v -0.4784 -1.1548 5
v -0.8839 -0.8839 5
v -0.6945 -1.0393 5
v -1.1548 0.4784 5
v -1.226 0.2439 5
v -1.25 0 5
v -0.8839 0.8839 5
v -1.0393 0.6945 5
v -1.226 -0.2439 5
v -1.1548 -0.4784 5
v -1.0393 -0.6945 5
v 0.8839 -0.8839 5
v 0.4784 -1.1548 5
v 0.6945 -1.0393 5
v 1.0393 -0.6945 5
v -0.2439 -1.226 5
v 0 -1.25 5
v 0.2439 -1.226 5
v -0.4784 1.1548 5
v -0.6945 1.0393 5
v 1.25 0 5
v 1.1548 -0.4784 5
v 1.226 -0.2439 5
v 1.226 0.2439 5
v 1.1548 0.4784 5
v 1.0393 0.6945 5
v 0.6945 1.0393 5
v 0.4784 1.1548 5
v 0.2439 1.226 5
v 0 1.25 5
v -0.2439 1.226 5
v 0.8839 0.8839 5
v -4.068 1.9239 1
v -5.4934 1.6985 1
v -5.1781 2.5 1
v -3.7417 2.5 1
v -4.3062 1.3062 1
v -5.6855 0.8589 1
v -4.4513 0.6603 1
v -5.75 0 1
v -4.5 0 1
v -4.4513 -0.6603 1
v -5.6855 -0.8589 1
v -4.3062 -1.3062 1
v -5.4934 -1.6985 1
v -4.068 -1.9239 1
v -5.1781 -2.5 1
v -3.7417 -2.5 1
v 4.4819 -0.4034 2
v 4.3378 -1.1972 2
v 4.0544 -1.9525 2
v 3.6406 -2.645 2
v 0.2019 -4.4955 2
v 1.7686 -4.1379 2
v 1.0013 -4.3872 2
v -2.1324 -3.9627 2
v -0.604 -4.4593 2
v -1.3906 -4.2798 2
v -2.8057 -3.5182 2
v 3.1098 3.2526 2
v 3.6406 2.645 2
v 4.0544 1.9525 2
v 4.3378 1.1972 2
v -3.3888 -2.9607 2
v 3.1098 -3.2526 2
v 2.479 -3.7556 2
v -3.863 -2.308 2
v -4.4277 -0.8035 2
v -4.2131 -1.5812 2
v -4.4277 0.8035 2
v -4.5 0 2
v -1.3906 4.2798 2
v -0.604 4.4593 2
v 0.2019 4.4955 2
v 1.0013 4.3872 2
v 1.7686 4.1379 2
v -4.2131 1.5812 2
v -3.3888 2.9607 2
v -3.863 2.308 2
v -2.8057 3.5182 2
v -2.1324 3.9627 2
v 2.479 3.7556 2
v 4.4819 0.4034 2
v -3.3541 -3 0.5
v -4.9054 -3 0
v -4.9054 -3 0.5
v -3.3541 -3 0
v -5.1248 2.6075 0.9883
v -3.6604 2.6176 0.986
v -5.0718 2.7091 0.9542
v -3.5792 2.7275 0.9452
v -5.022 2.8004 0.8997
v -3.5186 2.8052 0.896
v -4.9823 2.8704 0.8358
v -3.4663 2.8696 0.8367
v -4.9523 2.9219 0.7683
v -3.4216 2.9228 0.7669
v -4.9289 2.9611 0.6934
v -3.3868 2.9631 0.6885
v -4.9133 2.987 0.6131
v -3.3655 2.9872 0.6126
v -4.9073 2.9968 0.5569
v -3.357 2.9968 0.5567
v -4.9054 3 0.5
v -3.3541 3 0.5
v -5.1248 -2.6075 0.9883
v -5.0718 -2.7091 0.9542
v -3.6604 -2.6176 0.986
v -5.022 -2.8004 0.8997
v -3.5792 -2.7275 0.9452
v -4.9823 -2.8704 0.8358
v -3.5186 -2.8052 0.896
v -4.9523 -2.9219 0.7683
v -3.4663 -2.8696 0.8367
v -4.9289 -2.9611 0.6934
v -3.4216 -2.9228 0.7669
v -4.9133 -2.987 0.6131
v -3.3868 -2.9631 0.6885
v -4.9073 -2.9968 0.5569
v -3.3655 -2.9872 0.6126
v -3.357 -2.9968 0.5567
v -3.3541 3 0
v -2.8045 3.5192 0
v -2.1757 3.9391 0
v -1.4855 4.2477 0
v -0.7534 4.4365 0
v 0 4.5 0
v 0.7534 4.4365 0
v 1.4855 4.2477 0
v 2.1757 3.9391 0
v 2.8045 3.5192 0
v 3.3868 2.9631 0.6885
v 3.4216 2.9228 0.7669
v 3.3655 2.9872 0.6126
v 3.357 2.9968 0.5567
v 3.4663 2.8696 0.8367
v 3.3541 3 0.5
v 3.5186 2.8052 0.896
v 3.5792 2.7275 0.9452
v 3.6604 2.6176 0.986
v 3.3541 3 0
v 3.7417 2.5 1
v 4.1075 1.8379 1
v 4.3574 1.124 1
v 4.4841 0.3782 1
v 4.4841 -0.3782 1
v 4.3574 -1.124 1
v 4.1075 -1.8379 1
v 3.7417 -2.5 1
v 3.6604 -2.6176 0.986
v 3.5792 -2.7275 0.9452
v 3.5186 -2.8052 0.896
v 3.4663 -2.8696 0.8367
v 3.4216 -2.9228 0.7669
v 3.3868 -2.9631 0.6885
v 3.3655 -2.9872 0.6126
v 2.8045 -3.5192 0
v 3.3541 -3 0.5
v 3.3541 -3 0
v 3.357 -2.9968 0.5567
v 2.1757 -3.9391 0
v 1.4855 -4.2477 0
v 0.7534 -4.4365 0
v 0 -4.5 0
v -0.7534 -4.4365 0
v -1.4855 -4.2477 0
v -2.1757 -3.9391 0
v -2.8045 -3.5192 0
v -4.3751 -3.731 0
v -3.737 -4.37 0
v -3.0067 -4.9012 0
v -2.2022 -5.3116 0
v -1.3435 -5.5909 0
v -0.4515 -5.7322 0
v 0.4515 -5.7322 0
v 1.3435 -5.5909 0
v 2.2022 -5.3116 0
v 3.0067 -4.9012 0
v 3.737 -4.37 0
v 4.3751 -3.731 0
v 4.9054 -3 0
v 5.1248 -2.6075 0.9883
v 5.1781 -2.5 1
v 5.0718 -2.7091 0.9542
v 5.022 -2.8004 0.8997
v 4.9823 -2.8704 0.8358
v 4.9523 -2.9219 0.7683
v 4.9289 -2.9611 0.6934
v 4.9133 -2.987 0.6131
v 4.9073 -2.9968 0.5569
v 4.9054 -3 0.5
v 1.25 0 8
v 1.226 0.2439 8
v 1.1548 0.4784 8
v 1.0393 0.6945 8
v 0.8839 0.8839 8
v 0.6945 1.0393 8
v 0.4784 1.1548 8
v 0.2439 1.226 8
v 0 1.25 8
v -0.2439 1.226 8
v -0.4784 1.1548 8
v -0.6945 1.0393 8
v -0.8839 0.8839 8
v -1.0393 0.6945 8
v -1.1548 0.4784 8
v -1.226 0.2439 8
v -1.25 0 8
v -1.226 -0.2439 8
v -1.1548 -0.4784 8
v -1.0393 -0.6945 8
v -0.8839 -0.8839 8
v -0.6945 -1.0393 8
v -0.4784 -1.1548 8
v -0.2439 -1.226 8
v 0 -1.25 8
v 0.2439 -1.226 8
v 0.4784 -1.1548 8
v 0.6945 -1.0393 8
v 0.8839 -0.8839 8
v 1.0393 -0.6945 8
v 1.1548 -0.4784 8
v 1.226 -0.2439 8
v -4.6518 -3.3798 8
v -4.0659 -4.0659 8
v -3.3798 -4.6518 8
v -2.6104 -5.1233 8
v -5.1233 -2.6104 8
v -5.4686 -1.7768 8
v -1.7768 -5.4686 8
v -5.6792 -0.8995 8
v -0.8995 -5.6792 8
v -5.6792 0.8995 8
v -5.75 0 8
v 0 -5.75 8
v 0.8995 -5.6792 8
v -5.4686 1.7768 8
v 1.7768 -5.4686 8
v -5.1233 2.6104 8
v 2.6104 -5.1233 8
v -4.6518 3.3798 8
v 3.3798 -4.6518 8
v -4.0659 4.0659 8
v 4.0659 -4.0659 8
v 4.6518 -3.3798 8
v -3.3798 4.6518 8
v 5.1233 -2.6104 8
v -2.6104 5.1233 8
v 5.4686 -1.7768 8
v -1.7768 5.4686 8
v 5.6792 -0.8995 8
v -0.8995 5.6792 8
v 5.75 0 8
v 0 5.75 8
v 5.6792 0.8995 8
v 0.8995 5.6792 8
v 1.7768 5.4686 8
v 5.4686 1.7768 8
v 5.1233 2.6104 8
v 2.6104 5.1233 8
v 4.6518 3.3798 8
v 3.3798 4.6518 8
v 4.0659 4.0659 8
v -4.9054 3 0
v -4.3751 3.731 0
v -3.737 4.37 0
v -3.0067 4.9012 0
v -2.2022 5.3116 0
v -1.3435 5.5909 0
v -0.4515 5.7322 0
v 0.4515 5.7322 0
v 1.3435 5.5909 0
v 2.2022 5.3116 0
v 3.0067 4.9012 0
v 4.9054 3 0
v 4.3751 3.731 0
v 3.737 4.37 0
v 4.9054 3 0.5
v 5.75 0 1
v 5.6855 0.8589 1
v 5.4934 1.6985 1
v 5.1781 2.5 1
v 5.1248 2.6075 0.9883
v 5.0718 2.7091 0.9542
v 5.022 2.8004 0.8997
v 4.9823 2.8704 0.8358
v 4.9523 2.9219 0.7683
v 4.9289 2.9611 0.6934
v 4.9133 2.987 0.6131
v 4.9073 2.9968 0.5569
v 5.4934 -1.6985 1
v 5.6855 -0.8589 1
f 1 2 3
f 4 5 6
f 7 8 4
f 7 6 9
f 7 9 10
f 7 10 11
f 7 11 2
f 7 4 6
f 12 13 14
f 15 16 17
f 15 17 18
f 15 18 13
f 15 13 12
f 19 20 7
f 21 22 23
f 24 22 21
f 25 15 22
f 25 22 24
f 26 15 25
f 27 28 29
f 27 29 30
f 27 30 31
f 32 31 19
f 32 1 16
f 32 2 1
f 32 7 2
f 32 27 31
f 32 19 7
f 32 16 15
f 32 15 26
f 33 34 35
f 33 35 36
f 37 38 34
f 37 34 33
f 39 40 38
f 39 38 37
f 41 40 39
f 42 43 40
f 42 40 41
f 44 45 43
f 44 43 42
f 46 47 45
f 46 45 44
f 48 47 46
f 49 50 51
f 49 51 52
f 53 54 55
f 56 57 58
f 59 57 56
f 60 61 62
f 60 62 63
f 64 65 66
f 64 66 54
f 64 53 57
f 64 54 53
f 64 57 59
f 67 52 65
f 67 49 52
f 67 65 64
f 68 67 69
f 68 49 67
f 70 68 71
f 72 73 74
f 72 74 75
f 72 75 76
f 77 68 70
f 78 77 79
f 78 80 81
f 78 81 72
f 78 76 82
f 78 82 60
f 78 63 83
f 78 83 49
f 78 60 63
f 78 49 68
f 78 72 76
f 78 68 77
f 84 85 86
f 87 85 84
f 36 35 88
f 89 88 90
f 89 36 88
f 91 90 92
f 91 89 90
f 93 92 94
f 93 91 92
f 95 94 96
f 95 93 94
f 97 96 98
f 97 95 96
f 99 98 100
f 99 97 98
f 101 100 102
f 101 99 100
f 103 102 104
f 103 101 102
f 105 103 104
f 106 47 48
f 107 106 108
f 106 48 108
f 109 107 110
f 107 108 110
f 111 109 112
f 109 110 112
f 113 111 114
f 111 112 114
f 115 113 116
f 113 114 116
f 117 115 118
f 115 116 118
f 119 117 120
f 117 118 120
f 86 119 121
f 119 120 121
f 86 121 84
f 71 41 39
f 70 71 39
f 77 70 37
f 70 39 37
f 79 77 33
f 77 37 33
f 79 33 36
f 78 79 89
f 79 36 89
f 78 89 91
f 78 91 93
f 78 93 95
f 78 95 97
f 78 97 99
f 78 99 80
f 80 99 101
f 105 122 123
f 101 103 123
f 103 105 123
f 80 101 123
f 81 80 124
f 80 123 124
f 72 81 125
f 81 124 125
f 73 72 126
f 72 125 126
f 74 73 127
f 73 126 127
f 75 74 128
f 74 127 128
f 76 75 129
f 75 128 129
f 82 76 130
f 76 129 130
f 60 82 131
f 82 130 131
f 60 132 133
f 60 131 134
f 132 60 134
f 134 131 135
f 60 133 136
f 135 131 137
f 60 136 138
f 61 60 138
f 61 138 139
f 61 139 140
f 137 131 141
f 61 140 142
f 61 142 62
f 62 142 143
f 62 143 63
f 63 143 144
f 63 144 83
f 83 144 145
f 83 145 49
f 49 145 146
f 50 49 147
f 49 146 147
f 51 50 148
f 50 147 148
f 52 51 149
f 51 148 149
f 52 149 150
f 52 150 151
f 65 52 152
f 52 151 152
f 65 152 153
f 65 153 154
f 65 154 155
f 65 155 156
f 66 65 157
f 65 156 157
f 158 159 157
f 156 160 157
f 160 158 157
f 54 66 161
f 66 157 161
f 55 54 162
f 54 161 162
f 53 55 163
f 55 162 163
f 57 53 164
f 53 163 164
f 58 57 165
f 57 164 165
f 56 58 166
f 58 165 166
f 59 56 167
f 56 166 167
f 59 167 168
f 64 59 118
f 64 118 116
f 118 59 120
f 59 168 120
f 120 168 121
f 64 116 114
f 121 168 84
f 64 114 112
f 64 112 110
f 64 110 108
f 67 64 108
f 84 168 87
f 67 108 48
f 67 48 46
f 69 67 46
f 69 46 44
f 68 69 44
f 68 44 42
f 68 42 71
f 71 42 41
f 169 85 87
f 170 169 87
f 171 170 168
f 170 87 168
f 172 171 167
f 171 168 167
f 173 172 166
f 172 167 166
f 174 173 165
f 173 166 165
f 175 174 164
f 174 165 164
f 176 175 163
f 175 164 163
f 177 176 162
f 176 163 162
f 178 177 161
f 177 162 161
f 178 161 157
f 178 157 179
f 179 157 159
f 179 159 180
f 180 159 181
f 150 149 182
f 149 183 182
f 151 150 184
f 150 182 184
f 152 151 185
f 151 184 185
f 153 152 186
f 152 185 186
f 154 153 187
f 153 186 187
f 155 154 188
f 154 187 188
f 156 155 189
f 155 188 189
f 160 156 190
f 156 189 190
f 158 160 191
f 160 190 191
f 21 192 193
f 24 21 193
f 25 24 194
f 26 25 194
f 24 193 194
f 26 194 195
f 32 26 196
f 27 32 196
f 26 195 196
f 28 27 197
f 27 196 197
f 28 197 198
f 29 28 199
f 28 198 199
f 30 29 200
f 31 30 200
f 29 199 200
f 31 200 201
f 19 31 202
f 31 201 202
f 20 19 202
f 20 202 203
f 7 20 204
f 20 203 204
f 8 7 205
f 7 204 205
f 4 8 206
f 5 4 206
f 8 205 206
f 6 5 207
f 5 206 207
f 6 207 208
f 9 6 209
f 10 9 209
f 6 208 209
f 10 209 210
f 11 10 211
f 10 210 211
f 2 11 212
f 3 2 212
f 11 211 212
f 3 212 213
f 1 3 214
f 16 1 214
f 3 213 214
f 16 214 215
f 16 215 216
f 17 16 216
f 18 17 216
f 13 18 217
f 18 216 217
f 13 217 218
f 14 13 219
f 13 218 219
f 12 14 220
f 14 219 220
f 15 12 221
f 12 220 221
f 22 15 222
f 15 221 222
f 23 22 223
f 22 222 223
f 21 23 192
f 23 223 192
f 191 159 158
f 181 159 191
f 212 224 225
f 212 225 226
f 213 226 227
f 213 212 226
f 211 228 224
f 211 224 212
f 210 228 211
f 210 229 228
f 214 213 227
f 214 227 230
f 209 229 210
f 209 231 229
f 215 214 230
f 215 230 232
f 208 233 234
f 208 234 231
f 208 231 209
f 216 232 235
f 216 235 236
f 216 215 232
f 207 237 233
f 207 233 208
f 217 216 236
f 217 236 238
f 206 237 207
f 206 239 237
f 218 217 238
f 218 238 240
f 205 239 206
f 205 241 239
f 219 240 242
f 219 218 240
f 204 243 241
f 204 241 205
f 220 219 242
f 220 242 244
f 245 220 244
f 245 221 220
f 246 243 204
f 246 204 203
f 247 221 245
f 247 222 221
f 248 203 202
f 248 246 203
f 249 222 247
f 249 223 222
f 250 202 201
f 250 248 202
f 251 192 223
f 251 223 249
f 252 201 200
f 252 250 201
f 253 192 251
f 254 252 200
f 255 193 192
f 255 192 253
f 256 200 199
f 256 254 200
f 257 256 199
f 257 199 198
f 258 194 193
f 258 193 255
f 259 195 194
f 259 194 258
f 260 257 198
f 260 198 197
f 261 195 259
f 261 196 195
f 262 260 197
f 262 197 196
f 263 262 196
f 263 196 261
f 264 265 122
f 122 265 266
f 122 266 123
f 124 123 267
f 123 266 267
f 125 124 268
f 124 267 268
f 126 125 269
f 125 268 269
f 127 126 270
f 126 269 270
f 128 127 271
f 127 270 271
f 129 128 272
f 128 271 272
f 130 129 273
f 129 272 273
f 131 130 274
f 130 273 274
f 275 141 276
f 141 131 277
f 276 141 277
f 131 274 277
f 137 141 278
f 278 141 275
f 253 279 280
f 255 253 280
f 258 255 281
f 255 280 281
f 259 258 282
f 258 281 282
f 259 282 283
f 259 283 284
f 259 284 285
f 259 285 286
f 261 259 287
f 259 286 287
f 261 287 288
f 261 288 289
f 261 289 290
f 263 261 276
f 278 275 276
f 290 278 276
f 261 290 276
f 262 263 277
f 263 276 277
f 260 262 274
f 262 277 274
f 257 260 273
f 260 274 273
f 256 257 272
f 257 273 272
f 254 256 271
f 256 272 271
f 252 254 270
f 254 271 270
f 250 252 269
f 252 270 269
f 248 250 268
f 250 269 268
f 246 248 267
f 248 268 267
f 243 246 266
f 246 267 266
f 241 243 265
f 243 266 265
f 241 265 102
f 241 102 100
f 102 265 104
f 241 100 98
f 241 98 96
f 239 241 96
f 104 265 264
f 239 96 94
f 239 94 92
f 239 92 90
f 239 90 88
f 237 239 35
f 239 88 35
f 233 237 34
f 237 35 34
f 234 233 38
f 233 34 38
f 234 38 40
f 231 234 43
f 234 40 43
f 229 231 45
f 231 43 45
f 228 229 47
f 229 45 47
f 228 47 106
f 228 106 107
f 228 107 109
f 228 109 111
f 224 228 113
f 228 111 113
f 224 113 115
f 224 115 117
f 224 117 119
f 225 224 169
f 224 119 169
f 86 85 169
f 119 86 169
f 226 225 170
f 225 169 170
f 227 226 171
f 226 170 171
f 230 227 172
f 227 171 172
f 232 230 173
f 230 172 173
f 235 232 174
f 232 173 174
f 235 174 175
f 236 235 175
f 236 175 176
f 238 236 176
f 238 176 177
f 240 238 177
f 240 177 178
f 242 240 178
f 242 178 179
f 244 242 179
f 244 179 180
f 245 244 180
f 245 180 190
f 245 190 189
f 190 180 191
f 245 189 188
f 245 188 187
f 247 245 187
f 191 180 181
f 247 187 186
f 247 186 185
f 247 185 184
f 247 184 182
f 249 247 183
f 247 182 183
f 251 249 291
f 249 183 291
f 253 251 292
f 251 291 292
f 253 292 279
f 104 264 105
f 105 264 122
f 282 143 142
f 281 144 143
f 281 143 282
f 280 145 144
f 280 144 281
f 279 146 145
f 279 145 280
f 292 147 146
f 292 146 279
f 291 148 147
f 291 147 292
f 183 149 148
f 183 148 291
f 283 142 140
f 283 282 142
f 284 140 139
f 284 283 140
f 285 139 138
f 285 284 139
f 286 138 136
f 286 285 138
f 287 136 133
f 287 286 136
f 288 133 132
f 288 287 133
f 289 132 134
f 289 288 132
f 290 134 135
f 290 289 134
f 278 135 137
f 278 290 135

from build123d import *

# Parameters (mm, degrees)
SKIZZE1_R                       = 5.75
AUFSATZ_LINEAR_AUSTRAGEN1_DEPTH = 8
SKIZZE2_R                       = 4.5
SCHNITT_LINEAR_AUSTRAGEN1_DEPTH = 1
SKIZZE3_W                       = 13.35916622
SKIZZE3_H                       = 6
SCHNITT_LINEAR_AUSTRAGEN2_DEPTH = 1
VERRUNDUNG1_R                   = 0.5
SKIZZE4_R                       = 1.25
SCHNITT_LINEAR_AUSTRAGEN3_DEPTH = 3
SKIZZE5_R                       = 4.5
SCHNITT_LINEAR_AUSTRAGEN4_DEPTH = 1


with BuildPart() as part:
    # Skizze1 → Aufsatz-Linear austragen1 (new body)
    with BuildSketch(Plane(origin=(0, 0, 0), x_dir=(0, 1, 0), z_dir=(0, 0, 1))):
        with Locations(Location((0, 0, 0), (0, 0, 270))):
            Circle(SKIZZE1_R)
    extrude(amount=AUFSATZ_LINEAR_AUSTRAGEN1_DEPTH)

    # Skizze2 → Schnitt-Linear austragen1 (cut)
    with BuildSketch(Plane(origin=(0, 0, 0), x_dir=(1, 0, 0), z_dir=(0, 0, -1))):
        with Locations(Location((0, 0, 0), (0, 0, 180))):
            Circle(SKIZZE2_R)
    extrude(amount=-SCHNITT_LINEAR_AUSTRAGEN1_DEPTH, mode=Mode.SUBTRACT)

    # Skizze3 → Schnitt-Linear austragen2 (cut)
    with BuildSketch(Plane(origin=(0, 0, 0), x_dir=(1, 0, 0), z_dir=(0, 0, -1))):
        Rectangle(SKIZZE3_W, SKIZZE3_H)
    extrude(amount=-SCHNITT_LINEAR_AUSTRAGEN2_DEPTH, mode=Mode.SUBTRACT)

    # Verrundung1
    verrundung1_edges = [part.edges().sort_by_distance(p)[0] for p in [
        (4.129728092, 3, 1),
        (-4.129728092, 3, 1),
        (-4.129728092, -3, 1),
        (4.129728092, -3, 1),
    ]]
    fillet(verrundung1_edges, radius=VERRUNDUNG1_R)

    # Skizze4 → Schnitt-Linear austragen3 (cut)
    with BuildSketch(Plane.XY.offset(8)):
        Circle(SKIZZE4_R)
    extrude(amount=-SCHNITT_LINEAR_AUSTRAGEN3_DEPTH, mode=Mode.SUBTRACT)

    # Skizze5 → Schnitt-Linear austragen4 (cut)
    with BuildSketch(Plane(origin=(0, 0, 1), x_dir=(1, 0, 0), z_dir=(0, 0, -1))):
        with Locations(Location((0, 0, 0), (0, 0, 180))):
            Circle(SKIZZE5_R)
    extrude(amount=-SCHNITT_LINEAR_AUSTRAGEN4_DEPTH, mode=Mode.SUBTRACT)


solid = part.part
